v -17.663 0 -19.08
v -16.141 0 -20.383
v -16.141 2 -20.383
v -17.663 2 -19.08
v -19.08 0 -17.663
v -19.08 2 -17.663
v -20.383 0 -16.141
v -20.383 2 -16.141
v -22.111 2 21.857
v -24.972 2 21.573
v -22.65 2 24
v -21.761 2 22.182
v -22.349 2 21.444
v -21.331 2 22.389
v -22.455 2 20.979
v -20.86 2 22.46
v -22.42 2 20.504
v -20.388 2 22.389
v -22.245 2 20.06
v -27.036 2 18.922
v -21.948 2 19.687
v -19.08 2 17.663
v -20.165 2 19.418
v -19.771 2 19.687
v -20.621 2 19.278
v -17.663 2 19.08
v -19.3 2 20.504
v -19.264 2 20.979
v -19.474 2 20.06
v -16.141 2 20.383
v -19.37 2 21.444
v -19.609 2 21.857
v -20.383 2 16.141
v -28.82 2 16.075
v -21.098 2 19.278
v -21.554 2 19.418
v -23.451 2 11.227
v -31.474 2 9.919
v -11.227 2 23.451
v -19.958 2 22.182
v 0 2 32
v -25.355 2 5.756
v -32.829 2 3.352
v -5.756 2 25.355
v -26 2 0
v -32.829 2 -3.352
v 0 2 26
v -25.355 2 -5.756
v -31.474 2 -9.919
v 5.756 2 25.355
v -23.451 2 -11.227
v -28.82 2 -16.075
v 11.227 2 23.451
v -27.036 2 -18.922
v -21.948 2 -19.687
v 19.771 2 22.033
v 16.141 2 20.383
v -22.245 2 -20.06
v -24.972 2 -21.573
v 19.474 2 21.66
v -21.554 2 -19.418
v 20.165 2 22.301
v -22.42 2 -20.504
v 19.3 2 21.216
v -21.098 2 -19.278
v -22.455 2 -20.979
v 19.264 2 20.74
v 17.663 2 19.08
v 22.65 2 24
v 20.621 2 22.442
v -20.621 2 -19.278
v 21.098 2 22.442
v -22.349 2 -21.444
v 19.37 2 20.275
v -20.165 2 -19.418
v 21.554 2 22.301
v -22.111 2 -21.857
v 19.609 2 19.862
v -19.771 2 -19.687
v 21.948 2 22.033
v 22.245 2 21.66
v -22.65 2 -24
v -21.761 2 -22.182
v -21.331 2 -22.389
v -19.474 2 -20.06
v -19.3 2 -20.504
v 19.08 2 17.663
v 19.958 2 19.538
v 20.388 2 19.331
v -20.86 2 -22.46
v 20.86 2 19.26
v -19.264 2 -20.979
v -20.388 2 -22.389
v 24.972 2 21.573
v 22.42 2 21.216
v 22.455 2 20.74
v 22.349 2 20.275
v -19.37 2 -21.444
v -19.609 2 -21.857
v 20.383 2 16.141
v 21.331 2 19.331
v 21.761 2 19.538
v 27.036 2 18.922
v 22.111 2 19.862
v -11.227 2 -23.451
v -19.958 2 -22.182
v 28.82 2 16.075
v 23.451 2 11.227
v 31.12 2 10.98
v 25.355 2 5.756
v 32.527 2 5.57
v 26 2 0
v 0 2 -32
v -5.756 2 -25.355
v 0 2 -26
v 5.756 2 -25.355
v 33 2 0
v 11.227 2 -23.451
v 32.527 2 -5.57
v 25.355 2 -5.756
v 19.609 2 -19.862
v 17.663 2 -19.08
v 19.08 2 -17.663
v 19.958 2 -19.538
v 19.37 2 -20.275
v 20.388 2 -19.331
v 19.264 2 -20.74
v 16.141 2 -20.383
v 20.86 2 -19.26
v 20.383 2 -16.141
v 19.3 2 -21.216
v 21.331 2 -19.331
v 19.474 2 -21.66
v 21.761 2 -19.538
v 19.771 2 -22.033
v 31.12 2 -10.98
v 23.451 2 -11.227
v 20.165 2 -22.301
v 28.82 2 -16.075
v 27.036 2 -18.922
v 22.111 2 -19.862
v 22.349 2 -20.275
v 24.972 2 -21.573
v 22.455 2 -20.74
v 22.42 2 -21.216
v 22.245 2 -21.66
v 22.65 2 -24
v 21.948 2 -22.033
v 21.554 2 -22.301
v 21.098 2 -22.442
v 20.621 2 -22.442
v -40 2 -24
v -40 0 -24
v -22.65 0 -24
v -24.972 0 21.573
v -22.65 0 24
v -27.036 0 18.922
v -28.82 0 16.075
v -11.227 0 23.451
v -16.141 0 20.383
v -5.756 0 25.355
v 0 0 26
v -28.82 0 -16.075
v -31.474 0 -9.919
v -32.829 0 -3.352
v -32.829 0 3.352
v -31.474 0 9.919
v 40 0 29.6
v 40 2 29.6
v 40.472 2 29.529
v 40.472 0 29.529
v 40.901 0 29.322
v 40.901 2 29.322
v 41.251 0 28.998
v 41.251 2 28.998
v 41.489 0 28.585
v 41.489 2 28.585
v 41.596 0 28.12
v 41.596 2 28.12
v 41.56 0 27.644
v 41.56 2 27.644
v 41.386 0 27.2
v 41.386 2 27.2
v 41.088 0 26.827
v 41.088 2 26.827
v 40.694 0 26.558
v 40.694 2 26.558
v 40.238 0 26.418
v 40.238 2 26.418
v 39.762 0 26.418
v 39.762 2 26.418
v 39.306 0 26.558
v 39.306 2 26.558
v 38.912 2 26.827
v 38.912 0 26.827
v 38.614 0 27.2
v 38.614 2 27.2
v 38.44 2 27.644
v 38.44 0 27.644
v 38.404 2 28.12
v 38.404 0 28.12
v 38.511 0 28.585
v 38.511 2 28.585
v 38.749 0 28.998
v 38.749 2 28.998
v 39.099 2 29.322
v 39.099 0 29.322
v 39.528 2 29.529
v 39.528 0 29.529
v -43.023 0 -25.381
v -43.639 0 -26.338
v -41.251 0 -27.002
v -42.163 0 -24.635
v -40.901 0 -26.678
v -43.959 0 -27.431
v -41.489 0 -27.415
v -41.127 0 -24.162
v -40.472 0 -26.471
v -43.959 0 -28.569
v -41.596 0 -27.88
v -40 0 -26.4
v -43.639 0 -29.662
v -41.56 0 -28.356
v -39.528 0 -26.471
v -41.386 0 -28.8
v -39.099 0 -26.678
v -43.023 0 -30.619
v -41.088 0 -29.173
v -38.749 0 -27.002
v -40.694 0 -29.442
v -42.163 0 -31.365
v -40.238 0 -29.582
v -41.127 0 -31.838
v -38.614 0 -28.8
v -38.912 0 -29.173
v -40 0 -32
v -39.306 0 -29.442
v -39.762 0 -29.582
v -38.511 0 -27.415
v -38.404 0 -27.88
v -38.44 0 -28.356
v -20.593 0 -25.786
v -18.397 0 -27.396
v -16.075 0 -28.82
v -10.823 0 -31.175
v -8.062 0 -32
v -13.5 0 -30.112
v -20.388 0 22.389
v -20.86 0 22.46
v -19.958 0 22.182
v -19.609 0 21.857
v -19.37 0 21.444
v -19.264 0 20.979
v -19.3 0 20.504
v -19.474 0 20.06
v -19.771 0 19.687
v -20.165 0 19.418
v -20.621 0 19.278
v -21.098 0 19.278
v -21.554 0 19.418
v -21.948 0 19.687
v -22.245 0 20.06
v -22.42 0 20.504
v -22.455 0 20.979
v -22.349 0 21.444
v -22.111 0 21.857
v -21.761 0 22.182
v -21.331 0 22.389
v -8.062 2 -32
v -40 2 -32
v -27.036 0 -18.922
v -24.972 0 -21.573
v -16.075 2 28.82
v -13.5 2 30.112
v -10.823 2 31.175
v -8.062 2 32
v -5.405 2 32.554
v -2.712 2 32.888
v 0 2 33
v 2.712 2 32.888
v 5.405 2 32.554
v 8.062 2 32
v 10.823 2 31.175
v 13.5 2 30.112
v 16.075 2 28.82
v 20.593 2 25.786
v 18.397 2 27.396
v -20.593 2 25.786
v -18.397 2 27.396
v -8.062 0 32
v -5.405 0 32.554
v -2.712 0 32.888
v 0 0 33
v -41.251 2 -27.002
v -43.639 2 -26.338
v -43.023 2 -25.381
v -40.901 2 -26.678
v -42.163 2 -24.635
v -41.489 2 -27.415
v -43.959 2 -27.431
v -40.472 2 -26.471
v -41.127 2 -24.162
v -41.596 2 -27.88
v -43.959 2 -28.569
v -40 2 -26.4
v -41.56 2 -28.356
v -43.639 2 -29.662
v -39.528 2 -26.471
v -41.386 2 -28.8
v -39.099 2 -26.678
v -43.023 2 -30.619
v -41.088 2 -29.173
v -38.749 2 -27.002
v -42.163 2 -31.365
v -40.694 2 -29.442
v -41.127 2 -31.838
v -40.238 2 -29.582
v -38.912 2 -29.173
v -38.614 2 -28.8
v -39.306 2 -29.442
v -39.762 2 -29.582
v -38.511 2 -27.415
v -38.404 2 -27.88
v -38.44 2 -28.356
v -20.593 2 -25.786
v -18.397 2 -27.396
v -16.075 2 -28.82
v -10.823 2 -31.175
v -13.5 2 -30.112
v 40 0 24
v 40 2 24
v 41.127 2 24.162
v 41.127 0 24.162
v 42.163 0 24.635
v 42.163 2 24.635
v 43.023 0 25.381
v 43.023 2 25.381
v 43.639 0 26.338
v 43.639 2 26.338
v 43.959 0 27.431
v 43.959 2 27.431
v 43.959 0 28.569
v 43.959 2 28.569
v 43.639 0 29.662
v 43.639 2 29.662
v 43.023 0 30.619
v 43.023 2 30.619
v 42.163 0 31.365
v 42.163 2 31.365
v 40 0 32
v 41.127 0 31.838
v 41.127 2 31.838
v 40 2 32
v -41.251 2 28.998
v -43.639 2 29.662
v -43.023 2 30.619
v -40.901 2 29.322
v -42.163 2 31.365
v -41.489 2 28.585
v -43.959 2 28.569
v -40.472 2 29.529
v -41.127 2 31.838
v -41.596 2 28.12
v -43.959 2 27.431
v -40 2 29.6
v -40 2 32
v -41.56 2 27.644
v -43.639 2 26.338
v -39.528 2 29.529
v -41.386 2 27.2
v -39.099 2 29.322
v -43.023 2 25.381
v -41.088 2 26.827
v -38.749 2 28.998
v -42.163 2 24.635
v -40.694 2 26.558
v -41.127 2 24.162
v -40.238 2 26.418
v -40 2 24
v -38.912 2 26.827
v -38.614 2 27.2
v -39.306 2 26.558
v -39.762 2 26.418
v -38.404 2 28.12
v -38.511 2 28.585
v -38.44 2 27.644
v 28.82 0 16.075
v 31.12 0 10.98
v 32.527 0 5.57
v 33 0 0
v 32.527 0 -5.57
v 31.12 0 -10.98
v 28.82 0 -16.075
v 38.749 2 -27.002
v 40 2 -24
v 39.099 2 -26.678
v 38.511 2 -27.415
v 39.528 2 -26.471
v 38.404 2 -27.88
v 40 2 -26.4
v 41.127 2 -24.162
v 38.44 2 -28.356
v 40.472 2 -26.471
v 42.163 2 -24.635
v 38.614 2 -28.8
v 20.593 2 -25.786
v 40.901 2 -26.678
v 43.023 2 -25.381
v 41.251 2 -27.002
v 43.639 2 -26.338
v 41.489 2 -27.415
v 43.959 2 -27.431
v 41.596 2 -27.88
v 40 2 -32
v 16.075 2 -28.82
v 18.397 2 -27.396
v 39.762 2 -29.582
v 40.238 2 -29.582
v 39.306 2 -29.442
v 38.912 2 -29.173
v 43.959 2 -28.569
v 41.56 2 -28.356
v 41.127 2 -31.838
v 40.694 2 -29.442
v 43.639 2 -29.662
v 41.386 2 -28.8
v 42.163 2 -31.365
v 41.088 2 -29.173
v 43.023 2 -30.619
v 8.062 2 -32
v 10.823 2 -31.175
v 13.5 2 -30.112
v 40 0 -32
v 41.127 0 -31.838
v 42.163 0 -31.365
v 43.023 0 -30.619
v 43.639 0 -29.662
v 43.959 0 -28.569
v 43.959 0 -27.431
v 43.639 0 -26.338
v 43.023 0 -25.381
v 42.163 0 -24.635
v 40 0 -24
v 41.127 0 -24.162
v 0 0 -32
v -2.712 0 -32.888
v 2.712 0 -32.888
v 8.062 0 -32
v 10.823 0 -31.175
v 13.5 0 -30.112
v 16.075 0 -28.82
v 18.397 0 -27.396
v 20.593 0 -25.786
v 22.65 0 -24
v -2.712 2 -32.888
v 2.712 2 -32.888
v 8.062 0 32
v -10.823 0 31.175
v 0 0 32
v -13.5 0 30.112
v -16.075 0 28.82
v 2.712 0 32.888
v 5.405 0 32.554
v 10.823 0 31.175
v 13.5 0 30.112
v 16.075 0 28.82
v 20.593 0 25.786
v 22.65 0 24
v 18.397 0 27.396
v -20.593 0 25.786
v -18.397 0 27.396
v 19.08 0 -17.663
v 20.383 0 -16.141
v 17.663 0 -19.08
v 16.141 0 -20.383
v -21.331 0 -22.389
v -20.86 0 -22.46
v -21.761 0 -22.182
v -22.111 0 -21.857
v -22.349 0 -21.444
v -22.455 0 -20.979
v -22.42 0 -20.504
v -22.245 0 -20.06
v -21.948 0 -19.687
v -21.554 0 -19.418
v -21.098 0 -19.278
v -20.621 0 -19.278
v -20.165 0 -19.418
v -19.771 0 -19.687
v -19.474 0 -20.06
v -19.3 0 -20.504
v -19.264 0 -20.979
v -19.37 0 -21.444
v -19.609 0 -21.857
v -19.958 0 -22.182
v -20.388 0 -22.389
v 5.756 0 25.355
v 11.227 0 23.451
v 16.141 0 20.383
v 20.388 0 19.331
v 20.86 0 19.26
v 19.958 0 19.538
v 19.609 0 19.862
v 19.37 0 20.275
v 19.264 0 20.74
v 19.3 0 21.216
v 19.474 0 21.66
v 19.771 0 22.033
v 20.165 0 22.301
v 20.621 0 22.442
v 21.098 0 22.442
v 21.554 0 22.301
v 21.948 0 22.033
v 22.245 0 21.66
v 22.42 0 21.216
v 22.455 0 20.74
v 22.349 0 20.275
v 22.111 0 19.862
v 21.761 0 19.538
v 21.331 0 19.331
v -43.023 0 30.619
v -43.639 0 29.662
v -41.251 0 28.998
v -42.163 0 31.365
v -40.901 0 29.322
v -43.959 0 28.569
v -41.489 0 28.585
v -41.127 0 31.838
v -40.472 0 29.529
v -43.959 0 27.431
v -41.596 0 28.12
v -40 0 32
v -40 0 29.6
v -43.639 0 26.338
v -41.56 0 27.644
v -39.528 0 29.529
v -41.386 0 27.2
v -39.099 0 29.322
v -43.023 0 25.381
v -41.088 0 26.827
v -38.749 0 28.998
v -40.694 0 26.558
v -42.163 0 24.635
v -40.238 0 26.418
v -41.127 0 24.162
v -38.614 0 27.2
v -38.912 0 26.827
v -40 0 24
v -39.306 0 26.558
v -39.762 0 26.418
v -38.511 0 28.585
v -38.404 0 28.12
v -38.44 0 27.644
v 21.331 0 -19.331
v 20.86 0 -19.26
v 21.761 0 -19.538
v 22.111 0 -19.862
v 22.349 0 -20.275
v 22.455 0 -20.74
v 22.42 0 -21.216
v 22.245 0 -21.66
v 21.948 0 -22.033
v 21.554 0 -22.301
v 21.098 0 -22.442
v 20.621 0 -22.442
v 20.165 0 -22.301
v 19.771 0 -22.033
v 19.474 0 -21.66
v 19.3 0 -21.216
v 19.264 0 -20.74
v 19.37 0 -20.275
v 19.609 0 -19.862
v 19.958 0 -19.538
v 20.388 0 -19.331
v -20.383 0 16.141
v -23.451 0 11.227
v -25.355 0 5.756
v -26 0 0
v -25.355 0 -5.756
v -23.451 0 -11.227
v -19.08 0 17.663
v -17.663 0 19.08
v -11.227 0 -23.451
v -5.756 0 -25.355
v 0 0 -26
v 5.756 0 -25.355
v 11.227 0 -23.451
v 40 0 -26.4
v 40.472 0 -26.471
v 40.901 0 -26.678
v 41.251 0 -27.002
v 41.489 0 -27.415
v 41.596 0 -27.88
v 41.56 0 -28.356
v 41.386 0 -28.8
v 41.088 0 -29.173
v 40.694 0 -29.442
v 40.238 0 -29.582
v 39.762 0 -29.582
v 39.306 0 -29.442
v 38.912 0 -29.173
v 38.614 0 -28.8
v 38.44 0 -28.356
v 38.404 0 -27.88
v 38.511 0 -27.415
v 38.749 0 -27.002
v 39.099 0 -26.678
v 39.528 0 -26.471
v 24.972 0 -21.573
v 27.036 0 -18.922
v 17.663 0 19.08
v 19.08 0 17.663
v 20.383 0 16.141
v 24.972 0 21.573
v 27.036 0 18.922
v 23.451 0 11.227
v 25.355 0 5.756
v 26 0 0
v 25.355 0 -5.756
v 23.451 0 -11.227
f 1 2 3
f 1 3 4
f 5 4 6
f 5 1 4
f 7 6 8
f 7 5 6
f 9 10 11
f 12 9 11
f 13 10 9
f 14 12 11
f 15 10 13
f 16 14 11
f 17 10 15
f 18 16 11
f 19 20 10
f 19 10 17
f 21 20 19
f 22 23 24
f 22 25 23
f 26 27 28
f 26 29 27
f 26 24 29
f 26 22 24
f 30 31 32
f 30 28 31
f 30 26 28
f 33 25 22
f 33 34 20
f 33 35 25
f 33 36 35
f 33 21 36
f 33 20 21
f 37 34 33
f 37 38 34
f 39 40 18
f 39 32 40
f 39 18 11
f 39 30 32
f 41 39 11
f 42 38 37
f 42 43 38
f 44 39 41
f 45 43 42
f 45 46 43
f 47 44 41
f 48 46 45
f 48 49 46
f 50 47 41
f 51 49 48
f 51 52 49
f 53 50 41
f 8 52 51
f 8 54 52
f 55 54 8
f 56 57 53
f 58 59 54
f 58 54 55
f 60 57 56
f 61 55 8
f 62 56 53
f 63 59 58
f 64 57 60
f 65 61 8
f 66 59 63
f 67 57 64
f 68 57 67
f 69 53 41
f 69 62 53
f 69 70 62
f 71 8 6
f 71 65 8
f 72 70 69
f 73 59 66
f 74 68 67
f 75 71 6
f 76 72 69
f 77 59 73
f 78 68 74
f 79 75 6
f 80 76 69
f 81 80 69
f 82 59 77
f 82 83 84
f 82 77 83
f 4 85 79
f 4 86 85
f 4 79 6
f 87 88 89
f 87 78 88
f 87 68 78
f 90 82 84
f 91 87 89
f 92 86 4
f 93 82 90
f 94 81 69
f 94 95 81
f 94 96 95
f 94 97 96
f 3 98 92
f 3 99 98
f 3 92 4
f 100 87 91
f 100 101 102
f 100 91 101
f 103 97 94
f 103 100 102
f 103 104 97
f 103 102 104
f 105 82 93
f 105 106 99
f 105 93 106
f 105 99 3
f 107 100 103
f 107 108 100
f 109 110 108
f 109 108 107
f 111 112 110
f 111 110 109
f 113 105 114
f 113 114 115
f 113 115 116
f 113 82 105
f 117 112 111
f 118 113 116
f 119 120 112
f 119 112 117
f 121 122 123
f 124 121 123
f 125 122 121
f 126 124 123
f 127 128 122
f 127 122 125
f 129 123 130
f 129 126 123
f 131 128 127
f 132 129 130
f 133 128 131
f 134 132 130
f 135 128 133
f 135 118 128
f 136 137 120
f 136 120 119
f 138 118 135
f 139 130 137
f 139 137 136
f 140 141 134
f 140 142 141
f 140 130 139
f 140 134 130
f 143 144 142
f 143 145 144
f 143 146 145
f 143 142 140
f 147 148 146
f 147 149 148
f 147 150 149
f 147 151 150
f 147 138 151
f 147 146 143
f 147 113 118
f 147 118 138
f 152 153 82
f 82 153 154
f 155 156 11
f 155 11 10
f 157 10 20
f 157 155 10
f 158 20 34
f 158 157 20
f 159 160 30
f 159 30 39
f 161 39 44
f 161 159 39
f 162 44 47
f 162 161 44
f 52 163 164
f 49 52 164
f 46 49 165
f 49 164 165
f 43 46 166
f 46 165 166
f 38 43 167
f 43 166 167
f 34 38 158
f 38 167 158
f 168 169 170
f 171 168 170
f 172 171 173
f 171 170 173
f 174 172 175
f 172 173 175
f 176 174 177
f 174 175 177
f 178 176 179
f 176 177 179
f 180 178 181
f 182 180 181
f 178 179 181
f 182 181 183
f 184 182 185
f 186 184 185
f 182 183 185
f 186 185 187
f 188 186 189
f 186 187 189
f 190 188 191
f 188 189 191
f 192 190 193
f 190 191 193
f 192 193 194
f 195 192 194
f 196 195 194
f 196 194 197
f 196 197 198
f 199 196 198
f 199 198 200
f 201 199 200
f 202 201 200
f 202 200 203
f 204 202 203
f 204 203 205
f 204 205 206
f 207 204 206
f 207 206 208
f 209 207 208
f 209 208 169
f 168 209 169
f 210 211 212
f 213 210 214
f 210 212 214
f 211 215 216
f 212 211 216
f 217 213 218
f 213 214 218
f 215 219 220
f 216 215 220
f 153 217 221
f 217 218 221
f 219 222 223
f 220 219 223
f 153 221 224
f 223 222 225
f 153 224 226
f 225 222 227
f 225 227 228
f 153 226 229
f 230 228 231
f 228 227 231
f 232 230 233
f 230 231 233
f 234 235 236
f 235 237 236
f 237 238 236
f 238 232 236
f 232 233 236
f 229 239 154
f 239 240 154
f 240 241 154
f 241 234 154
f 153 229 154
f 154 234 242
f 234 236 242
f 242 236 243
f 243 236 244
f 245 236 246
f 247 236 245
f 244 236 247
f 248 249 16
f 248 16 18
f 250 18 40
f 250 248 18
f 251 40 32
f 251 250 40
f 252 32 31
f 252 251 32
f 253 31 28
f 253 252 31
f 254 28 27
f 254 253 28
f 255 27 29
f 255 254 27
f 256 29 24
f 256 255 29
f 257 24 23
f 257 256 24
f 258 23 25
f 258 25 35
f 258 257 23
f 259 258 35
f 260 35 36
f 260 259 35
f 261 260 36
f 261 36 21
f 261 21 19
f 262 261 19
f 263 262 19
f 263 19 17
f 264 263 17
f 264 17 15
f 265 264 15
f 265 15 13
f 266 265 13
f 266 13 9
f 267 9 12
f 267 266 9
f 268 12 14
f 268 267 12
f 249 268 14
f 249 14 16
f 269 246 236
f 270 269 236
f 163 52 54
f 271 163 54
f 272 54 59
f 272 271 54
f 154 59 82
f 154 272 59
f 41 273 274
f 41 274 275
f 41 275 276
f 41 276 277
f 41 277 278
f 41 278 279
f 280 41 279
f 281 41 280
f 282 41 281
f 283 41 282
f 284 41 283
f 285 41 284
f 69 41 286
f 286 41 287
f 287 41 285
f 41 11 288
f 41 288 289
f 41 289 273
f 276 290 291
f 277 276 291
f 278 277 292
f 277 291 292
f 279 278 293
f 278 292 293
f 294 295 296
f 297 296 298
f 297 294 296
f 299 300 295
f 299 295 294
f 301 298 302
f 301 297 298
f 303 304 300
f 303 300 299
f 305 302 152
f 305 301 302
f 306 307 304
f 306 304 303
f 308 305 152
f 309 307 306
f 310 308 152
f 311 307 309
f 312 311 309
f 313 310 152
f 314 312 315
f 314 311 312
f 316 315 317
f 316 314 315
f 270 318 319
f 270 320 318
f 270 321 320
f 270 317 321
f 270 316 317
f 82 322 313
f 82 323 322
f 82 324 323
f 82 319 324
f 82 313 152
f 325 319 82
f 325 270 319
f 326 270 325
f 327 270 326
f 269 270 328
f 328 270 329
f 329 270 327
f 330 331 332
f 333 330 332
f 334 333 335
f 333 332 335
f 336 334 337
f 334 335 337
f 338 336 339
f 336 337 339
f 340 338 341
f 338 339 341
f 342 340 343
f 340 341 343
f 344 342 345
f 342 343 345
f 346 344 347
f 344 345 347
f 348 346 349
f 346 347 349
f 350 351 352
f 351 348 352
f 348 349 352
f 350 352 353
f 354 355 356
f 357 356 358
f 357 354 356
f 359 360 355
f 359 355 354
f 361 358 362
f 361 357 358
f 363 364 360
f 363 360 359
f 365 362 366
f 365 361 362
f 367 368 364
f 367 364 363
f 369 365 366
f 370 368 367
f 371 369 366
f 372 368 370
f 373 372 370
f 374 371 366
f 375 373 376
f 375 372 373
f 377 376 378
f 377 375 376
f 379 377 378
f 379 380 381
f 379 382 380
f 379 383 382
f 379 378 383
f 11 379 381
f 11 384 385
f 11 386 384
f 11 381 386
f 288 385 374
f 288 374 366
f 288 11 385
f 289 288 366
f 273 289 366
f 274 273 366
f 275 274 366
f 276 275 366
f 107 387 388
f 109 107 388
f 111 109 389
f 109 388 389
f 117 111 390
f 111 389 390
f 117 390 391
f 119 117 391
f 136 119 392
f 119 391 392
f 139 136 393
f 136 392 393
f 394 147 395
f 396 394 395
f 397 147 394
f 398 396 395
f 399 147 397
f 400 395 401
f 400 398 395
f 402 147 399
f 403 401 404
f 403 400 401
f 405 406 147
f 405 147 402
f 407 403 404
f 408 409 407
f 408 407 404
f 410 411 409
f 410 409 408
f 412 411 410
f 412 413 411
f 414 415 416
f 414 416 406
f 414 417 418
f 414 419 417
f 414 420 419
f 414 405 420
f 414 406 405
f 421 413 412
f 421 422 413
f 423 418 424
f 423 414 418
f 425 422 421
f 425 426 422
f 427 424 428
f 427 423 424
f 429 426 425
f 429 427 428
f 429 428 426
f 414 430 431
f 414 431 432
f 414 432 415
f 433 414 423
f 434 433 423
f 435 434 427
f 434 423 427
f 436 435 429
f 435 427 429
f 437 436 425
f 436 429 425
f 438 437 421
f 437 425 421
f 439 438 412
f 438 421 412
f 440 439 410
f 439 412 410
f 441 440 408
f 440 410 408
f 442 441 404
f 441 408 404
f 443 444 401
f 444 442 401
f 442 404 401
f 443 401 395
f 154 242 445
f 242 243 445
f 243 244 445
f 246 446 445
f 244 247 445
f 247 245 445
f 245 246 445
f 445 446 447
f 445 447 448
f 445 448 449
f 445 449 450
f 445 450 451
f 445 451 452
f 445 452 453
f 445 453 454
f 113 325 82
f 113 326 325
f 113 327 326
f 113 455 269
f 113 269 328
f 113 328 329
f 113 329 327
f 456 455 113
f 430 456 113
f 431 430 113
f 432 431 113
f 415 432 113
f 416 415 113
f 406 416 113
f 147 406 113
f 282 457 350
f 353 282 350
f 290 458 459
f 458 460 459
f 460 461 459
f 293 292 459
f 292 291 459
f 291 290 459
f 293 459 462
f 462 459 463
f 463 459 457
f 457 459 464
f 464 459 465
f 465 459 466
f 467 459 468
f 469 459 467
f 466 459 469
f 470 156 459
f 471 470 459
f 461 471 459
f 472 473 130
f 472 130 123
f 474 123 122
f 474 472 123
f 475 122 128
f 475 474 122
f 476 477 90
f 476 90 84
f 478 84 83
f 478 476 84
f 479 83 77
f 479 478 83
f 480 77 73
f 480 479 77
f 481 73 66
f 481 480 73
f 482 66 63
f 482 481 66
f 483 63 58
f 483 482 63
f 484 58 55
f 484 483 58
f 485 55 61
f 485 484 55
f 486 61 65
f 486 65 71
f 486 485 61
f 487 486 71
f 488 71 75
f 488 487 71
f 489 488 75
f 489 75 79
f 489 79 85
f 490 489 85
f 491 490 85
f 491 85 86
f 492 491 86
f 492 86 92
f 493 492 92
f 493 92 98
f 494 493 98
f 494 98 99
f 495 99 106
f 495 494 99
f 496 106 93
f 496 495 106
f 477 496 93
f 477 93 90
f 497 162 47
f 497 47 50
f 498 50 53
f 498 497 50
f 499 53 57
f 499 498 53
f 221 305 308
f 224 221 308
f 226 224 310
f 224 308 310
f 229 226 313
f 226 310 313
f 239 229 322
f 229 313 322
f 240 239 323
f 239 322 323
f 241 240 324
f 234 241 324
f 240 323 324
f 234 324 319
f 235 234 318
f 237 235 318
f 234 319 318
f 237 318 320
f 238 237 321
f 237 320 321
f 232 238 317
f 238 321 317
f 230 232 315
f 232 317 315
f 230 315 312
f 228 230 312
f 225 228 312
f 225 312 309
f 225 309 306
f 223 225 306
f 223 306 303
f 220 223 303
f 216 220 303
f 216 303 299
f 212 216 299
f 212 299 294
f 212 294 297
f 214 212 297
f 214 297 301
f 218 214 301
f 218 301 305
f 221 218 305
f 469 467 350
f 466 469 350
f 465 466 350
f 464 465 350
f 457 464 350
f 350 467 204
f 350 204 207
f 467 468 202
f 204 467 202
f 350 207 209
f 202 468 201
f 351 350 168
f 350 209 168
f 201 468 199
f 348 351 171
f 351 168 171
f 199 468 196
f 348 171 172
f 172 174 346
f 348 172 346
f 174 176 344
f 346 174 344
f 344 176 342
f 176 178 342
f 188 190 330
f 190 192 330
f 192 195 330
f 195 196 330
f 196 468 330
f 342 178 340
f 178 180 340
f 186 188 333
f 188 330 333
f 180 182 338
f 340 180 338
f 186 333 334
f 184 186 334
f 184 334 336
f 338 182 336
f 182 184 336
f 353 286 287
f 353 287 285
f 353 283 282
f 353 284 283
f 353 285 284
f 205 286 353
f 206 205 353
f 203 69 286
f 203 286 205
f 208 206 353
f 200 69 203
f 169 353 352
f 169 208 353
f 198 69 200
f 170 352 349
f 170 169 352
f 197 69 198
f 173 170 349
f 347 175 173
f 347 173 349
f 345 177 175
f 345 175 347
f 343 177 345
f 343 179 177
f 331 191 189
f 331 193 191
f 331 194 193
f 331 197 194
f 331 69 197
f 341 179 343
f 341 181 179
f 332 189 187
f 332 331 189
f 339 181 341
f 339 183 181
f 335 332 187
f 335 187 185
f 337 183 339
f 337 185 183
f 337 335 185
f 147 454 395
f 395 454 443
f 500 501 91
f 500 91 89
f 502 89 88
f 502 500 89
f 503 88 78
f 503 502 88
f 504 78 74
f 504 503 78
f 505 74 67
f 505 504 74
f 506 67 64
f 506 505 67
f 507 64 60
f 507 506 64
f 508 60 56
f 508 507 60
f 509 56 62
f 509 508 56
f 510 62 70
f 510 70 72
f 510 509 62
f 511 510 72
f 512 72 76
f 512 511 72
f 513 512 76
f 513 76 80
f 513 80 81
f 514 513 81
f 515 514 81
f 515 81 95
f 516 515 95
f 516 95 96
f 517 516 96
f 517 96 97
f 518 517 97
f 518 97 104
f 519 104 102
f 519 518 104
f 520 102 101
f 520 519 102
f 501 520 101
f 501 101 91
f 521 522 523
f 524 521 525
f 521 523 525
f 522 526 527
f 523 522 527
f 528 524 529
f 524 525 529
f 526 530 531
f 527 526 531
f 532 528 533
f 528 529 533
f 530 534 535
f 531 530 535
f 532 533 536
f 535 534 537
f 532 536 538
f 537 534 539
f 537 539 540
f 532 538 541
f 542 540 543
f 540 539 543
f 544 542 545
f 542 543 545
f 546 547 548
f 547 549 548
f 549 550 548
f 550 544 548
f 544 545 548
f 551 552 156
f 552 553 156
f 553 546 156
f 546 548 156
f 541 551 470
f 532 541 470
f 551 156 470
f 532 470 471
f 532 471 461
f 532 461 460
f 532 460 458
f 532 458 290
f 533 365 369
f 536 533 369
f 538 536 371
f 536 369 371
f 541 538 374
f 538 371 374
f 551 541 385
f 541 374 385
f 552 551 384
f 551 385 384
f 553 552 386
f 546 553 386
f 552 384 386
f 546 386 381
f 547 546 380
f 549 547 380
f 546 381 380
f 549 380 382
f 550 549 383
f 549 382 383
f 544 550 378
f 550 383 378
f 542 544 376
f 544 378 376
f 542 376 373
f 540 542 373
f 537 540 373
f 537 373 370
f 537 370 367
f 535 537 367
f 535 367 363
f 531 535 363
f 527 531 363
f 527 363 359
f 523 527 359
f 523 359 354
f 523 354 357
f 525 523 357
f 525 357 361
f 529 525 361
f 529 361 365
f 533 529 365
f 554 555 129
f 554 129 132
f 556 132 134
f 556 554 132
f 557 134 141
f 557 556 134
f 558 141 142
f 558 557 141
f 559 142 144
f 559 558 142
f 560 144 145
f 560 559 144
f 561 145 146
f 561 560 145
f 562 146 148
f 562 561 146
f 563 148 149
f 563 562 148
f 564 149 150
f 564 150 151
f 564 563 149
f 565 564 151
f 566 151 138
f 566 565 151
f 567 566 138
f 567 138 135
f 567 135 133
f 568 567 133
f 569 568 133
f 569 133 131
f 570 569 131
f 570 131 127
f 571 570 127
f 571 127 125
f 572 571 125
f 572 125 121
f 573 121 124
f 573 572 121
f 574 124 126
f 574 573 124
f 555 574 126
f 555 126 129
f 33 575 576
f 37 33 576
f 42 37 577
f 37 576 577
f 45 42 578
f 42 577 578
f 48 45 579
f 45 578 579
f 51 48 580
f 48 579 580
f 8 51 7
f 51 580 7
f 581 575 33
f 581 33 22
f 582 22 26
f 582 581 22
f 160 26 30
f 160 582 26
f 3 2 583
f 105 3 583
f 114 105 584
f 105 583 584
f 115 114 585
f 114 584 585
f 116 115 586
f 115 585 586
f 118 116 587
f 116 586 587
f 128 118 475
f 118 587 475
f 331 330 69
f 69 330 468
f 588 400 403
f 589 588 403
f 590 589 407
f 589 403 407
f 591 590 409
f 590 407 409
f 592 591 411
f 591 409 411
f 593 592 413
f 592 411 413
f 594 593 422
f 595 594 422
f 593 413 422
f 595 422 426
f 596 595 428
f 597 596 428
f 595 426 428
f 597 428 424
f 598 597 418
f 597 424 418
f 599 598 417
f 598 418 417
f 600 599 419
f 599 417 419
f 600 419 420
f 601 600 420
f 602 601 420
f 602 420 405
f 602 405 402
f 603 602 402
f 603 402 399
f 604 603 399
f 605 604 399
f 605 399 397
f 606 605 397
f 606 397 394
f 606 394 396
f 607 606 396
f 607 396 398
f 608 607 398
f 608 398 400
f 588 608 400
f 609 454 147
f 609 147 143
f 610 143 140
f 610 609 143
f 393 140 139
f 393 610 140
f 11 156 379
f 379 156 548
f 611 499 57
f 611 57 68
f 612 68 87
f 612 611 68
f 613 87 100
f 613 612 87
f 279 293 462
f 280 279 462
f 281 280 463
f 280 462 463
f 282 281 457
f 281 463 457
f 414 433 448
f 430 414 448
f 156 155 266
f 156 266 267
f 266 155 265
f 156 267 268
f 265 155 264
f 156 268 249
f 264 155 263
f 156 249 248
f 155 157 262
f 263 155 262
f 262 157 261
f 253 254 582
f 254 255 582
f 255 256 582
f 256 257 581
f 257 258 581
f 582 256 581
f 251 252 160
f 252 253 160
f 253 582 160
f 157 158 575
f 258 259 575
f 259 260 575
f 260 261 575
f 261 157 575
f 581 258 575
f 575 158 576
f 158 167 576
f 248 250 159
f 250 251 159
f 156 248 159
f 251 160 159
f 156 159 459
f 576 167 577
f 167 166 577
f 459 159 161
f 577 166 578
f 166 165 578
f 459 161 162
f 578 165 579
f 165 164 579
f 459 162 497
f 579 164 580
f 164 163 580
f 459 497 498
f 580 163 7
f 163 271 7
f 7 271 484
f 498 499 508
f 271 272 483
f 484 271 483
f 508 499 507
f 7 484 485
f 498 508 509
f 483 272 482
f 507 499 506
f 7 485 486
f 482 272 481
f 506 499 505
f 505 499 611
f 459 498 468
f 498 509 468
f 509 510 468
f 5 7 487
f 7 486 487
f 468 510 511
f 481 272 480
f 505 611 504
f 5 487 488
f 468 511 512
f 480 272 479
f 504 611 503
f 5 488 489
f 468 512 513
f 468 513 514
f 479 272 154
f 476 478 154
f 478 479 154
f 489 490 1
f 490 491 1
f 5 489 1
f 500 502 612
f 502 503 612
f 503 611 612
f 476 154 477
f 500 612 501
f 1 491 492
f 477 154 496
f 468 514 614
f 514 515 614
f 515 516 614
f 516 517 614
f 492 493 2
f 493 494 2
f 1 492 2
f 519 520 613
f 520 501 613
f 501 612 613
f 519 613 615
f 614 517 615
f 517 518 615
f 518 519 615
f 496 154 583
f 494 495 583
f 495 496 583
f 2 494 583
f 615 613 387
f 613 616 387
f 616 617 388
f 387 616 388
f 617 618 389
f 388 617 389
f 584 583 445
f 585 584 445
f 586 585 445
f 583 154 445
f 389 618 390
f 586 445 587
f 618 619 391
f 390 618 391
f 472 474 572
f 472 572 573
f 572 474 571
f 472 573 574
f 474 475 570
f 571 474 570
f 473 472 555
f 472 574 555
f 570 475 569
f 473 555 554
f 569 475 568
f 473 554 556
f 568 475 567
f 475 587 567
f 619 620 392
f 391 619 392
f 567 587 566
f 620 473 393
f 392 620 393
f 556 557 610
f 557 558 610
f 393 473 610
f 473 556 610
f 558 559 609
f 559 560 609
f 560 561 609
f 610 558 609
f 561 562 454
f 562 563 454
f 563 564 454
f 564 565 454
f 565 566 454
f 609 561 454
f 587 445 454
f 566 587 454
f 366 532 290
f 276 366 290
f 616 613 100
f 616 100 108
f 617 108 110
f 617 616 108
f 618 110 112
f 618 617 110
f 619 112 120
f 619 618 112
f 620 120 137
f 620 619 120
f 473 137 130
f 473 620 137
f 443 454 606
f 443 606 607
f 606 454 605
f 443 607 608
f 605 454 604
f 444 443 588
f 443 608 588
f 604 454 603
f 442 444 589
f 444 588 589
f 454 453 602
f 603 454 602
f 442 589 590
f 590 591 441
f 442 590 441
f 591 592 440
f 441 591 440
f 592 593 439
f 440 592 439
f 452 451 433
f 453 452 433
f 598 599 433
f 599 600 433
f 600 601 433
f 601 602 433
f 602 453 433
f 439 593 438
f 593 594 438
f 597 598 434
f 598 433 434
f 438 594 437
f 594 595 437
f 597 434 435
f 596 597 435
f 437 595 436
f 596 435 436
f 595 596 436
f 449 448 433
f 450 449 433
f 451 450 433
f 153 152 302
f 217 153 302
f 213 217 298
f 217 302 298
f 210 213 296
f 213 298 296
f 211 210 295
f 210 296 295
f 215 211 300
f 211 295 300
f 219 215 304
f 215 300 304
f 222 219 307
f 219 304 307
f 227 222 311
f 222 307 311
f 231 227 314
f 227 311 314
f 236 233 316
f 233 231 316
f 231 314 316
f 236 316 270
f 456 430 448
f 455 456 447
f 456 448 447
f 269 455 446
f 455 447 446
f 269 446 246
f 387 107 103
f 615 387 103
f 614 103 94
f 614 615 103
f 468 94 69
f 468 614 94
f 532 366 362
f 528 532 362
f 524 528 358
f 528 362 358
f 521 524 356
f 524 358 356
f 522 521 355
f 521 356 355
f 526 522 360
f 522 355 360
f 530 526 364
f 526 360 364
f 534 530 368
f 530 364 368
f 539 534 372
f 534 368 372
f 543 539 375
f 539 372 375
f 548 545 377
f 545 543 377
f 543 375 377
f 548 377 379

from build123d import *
from build123d.topology import SkipClean

# Parameters (mm, degrees)
SKETCH1_R           = 1.6
BOSS_EXTRUDE1_DEPTH = 2
SKETCH2_R           = 48
SKETCH2_R_2         = 42
SKETCH2_R_3         = 1.6
BOSS_EXTRUDE2_DEPTH = 2
SKETCH3_R           = 1.6
BOSS_EXTRUDE3_DEPTH = 2
CUT_EXTRUDE1_DEPTH  = 10
FILLET1_R           = 3
BOSS_EXTRUDE4_DEPTH = 2
CUT_EXTRUDE2_START  = -10
SKETCH6_R           = 26
CUT_EXTRUDE2_DEPTH  = 10
CUT_EXTRUDE3_START  = -10
SKETCH7_R           = 112.740823419
SKETCH7_R_2         = 33
CUT_EXTRUDE3_DEPTH  = 10
BOSS_EXTRUDE5_START = -2
SKETCH8_R           = 1.6
SKETCH8_R_2         = 26
BOSS_EXTRUDE5_DEPTH = 2
SKETCH9_R           = 1.6
CUT_EXTRUDE4_DEPTH  = 5


with BuildPart() as part:
    # Sketch1 → Boss-Extrude1 (new body)
    with BuildSketch(Plane(origin=(0, 0, 0), x_dir=(1, 0, 0), z_dir=(0, 1, 0))):
        with BuildLine():
            Line((-51.943772875, 37.828427125), (-29.299283734, 15.183937983))
            ThreePointArc((-29.299283734, 15.183937983), (0, 33), (29.299283734, 15.183937983))
            Line((29.299283734, 15.183937983), (51.943772875, 37.828427125))
            ThreePointArc((51.943772875, 37.828427125), (57.600627125, 37.828427125), (57.600627125, 32.171572875))
            Line((57.600627125, 32.171572875), (32.280845123, 6.851790873))
            ThreePointArc((32.280845123, 6.851790873), (33, 0), (32.280845123, -6.851790873))
            Line((32.280845123, -6.851790873), (57.600627125, -32.171572875))
            ThreePointArc((57.600627125, -32.171572875), (57.600627125, -37.828427125), (51.943772875, -37.828427125))
            Line((51.943772875, -37.828427125), (29.299283734, -15.183937983))
            ThreePointArc((29.299283734, -15.183937983), (0, -33), (-29.299283734, -15.183937983))
            Line((-29.299283734, -15.183937983), (-51.943772875, -37.828427125))
            ThreePointArc((-51.943772875, -37.828427125), (-57.600627125, -37.828427125), (-57.600627125, -32.171572875))
            Line((-57.600627125, -32.171572875), (-32.280845123, -6.851790873))
            ThreePointArc((-32.280845123, -6.851790873), (-33, 0), (-32.280845123, 6.851790873))
            Line((-32.280845123, 6.851790873), (-57.600627125, 32.171572875))
            ThreePointArc((-57.600627125, 32.171572875), (-57.600627125, 37.828427125), (-51.943772875, 37.828427125))
        make_face()
        with Locations(Location((54.7722, 35, 0), (0, 0, 270))):
            Circle(SKETCH1_R, mode=Mode.SUBTRACT)
        with Locations(Location((-54.7722, 35, 0), (0, 0, 90))):
            Circle(SKETCH1_R, mode=Mode.SUBTRACT)
        with Locations(Location((54.7722, -35, 0), (0, 0, 90))):
            Circle(SKETCH1_R, mode=Mode.SUBTRACT)
        with Locations(Location((-54.7722, -35, 0), (0, 0, 270))):
            Circle(SKETCH1_R, mode=Mode.SUBTRACT)
        with Locations(Location((20.859650045, 20.859650045, 0), (0, 0, 270))):
            Circle(SKETCH1_R, mode=Mode.SUBTRACT)
        with Locations(Location((-20.859650045, 20.859650045, 0), (0, 0, 90))):
            Circle(SKETCH1_R, mode=Mode.SUBTRACT)
        with Locations(Location((20.859650045, -20.859650045, 0), (0, 0, 90))):
            Circle(SKETCH1_R, mode=Mode.SUBTRACT)
        with Locations(Location((-20.859650045, -20.859650045, 0), (0, 0, 270))):
            Circle(SKETCH1_R, mode=Mode.SUBTRACT)
        with BuildLine():
            Line((0, 4.242640687), (-16.140662024, 20.383302711))
            ThreePointArc((-16.140662024, 20.383302711), (0, 26), (16.140662024, 20.383302711))
            Line((16.140662024, 20.383302711), (0, 4.242640687))
        make_face(mode=Mode.SUBTRACT)
        with BuildLine():
            Line((0, -4.242640687), (-16.140662024, -20.383302711))
            ThreePointArc((-16.140662024, -20.383302711), (0, -26), (16.140662024, -20.383302711))
            Line((16.140662024, -20.383302711), (0, -4.242640687))
        make_face(mode=Mode.SUBTRACT)
        with BuildLine():
            Line((4.242640687, 0), (20.383302711, -16.140662024))
            ThreePointArc((20.383302711, -16.140662024), (26, 0), (20.383302711, 16.140662024))
            Line((20.383302711, 16.140662024), (4.242640687, 0))
        make_face(mode=Mode.SUBTRACT)
        with BuildLine():
            Line((-4.242640687, 0), (-20.383302711, -16.140662024))
            ThreePointArc((-20.383302711, -16.140662024), (-26, 0), (-20.383302711, 16.140662024))
            Line((-20.383302711, 16.140662024), (-4.242640687, 0))
        make_face(mode=Mode.SUBTRACT)
    extrude(amount=BOSS_EXTRUDE1_DEPTH)

    # Sketch2 → Boss-Extrude2 (add)
    with BuildSketch(Plane(origin=(0, 2, 0), x_dir=(1, 0, 0), z_dir=(0, 1, 0))):
        Circle(SKETCH2_R)
        Circle(SKETCH2_R_2, mode=Mode.SUBTRACT)
        with Locations(Location((31.819805153, 31.819805153, 0), (0, 0, 270))):
            Circle(SKETCH2_R_3, mode=Mode.SUBTRACT)
        with Locations(Location((-31.819805153, 31.819805153, 0), (0, 0, 270))):
            Circle(SKETCH2_R_3, mode=Mode.SUBTRACT)
        with Locations(Location((31.819805153, -31.819805153, 0), (0, 0, 270))):
            Circle(SKETCH2_R_3, mode=Mode.SUBTRACT)
        with Locations(Location((-31.819805153, -31.819805153, 0), (0, 0, 270))):
            Circle(SKETCH2_R_3, mode=Mode.SUBTRACT)
    extrude(amount=-BOSS_EXTRUDE2_DEPTH)

    # Sketch3 → Boss-Extrude3 (add)
    # profile 1 of 2: a face of its own
    with BuildSketch(Plane(origin=(0, 2, 0), x_dir=(1, 0, 0), z_dir=(0, 1, 0))):
        with BuildLine():
            Line((34.819811892, 31.819805153), (34.819811892, -31.819805153))
            ThreePointArc((34.819811892, -31.819805153), (31.819805153, -34.819811892), (28.819798415, -31.819805153))
            Line((28.819798415, -31.819805153), (28.819798415, 31.819805153))
            ThreePointArc((28.819798415, 31.819805153), (31.819805153, 34.819811892), (34.819811892, 31.819805153))
        make_face()
        with Locations(Location((31.819805153, -31.819805153, 0), (0, 0, 270))):
            Circle(SKETCH3_R, mode=Mode.SUBTRACT)
        with Locations(Location((31.819805153, 31.819805153, 0), (0, 0, 270))):
            Circle(SKETCH3_R, mode=Mode.SUBTRACT)
    # profile 2 of 2: a face of its own
    with BuildSketch(Plane(origin=(0, 2, 0), x_dir=(1, 0, 0), z_dir=(0, 1, 0))):
        with BuildLine():
            Line((-28.819798415, -31.819805153), (-28.819798415, 31.819805153))
            ThreePointArc((-28.819798415, 31.819805153), (-31.819805153, 34.819811892), (-34.819811892, 31.819805153))
            Line((-34.819811892, 31.819805153), (-34.819811892, -31.819805153))
            ThreePointArc((-34.819811892, -31.819805153), (-31.819805153, -34.819811892), (-28.819798415, -31.819805153))
        make_face()
        with Locations(Location((-31.819805153, 31.819805153, 0), (0, 0, 270))):
            Circle(SKETCH3_R, mode=Mode.SUBTRACT)
        with Locations(Location((-31.819805153, -31.819805153, 0), (0, 0, 270))):
            Circle(SKETCH3_R, mode=Mode.SUBTRACT)
    extrude(amount=-BOSS_EXTRUDE3_DEPTH)

    # Sketch4 → Cut-Extrude1 (cut)
    with BuildSketch(Plane(origin=(0, 2, 0), x_dir=(1, 0, 0), z_dir=(0, 1, 0))):
        Polygon((-28.819805153, 31.819805153), (-28.819805153, 24.740165209), (0, 38.846192425), (28.819805153, 24.740165209), (28.819805153, 31.819805153), (28.819805153, 53.488724091), (-28.819805153, 53.488724091), align=None)
        Polygon((28.819805153, -31.819805153), (28.819805153, -27.443703625), (0, -37.592318486), (-28.819805153, -27.443703625), (-28.819805153, -31.819805153), (-28.819805153, -57.678243433), (28.819805153, -57.678243433), align=None)
    extrude(amount=-CUT_EXTRUDE1_DEPTH, mode=Mode.SUBTRACT)

    # Fillet1
    # the kernel refuses this fillet: 3 mm, written as the material it takes off along each edge
    with BuildSketch(Plane(origin=(-28.819805153, -16.95161691, -38.385138152), x_dir=(0, 0, 1), z_dir=(0, 1, 0)), Plane(origin=(28.819805153, -16.95161691, 38.385138152), x_dir=(0, 0, -1), z_dir=(0, 1, 0))) as fillet1_piece_1:
        with BuildLine():
            CenterArc((6.565332998, -3), FILLET1_R, 90, 135)
            ThreePointArc((4.444012655, -5.121320344), (2.131461319, -2.639230371), (0, 0))
            Line((0, 0), (6.565332998, 0))
        make_face()
    extrude(amount=35.903233819, mode=Mode.SUBTRACT)
    with BuildSketch(Plane(origin=(-28.819805153, -16.95161691, 38.385138152), x_dir=(-0.755284934005079, 0, -0.6553965734308833), z_dir=(0, 1, 0)), Plane(origin=(28.819805153, -16.95161691, -38.385138152), x_dir=(0.7552849340050823, 0, 0.6553965734308795), z_dir=(0, 1, 0))) as fillet1_piece_2:
        with BuildLine():
            CenterArc((6.568751552, -2.99250738), FILLET1_R, 85.949727095, 135)
            Line((4.30289675, -4.9586971), (0, 0))
            ThreePointArc((0, 0), (3.390323382, 0.11988192), (6.780646764, 0))
        make_face()
    extrude(amount=35.903233819, mode=Mode.SUBTRACT)


with BuildPart() as boss_extrude4_tool:
    # Sketch5 → Boss-Extrude4 (new body)
    with BuildSketch(Plane(origin=(0, 2, 0), x_dir=(1, 0, 0), z_dir=(0, 1, 0))):
        Polygon((-31.819798415, 34.819811892), (31.819798415, 34.819811892), (29.753362448, 32.753375926), (28.819798415, 31.819811892), (28.819798415, 28.819811892), (0, 28.819811892), (-28.819798415, 28.819811892), (-28.819798415, 31.819811892), align=None)
        Polygon((-28.819798415, -31.819811892), (-31.819798415, -34.819811892), (31.819798415, -34.819811892), (29.753362448, -32.753375926), (28.819798415, -31.819811892), (28.819798415, -28.819811892), (0, -28.819811892), (-28.819798415, -28.819811892), align=None)
    extrude(amount=-BOSS_EXTRUDE4_DEPTH)


with BuildPart() as part_1:
    add(part.part)


with BuildPart() as part_2:
    # Boss-Extrude4: joined with boss_extrude4_tool
    add(part_1.part.fuse(boss_extrude4_tool.part, tol=0.00001))

    # Sketch6 → Cut-Extrude2 (cut)
    with BuildSketch(Plane(origin=(0, 2, 0), x_dir=(1, 0, 0), z_dir=(0, 1, 0)).offset(CUT_EXTRUDE2_START)):
        with Locations(Location((0, 0, 0), (0, 0, 270))):
            Circle(SKETCH6_R)
    extrude(amount=CUT_EXTRUDE2_DEPTH, mode=Mode.SUBTRACT)

    # Sketch7 → Cut-Extrude3 (cut)
    with SkipClean():  # the faces are left unmerged after this step: merging them gives an invalid solid
        with BuildSketch(Plane(origin=(0, 2, 0), x_dir=(1, 0, 0), z_dir=(0, 1, 0)).offset(CUT_EXTRUDE3_START)):
            Circle(SKETCH7_R)
            with Locations(Location((0, 0, 0), (0, 0, 270))):
                Circle(SKETCH7_R_2, mode=Mode.SUBTRACT)
        extrude(amount=CUT_EXTRUDE3_DEPTH, mode=Mode.SUBTRACT)

    # Sketch8 → Boss-Extrude5 (add)
    # profile 1 of 5: a face of its own
    with SkipClean():  # the faces are left unmerged after this step: merging them gives an invalid solid
        with BuildSketch(Plane(origin=(0, 2, 0), x_dir=(1, 0, 0), z_dir=(0, 1, 0)).offset(BOSS_EXTRUDE5_START)):
            with BuildLine():
                ThreePointArc((60, 24), (64, 28), (60, 32))
                Line((60, 32), (8.062257748, 32))
                ThreePointArc((8.062257748, 32), (15.86830384, 28.934355587), (22.649503306, 24))
                Line((22.649503306, 24), (60, 24))
            make_face()
            with Locations(Location((60, 28, 0), (0, 0, 270))):
                Circle(SKETCH8_R, mode=Mode.SUBTRACT)
        # profile 2 of 5: a face of its own
        with BuildSketch(Plane(origin=(0, 2, 0), x_dir=(1, 0, 0), z_dir=(0, 1, 0)).offset(BOSS_EXTRUDE5_START)):
            with BuildLine():
                ThreePointArc((-22.649503306, 24), (-15.86830384, 28.934355587), (-8.062257748, 32))
                Line((-8.062257748, 32), (-60, 32))
                ThreePointArc((-60, 32), (-64, 28), (-60, 24))
                Line((-60, 24), (-22.649503306, 24))
            make_face()
            with Locations(Location((-60, 28, 0), (0, 0, 270))):
                Circle(SKETCH8_R, mode=Mode.SUBTRACT)
        # profile 3 of 5: a face of its own
        with BuildSketch(Plane(origin=(0, 2, 0), x_dir=(1, 0, 0), z_dir=(0, 1, 0)).offset(BOSS_EXTRUDE5_START)):
            with BuildLine():
                ThreePointArc((-8.062257748, -32), (-15.86830384, -28.934355587), (-22.649503306, -24))
                Line((-22.649503306, -24), (-60, -24))
                ThreePointArc((-60, -24), (-64, -28), (-60, -32))
                Line((-60, -32), (-8.062257748, -32))
            make_face()
            with Locations(Location((-60, -28, 0), (0, 0, 270))):
                Circle(SKETCH8_R, mode=Mode.SUBTRACT)
        # profile 4 of 5: a face of its own
        with BuildSketch(Plane(origin=(0, 2, 0), x_dir=(1, 0, 0), z_dir=(0, 1, 0)).offset(BOSS_EXTRUDE5_START)):
            with BuildLine():
                Line((60, -24), (22.649503306, -24))
                ThreePointArc((22.649503306, -24), (15.86830384, -28.934355587), (8.062257748, -32))
                Line((8.062257748, -32), (60, -32))
                ThreePointArc((60, -32), (64, -28), (60, -24))
            make_face()
            with Locations(Location((60, -28, 0), (0, 0, 270))):
                Circle(SKETCH8_R, mode=Mode.SUBTRACT)
        # profile 5 of 5: a face of its own
        with BuildSketch(Plane(origin=(0, 2, 0), x_dir=(1, 0, 0), z_dir=(0, 1, 0)).offset(BOSS_EXTRUDE5_START)):
            with BuildLine():
                Line((22.649503306, 24), (0, 32))
                Line((0, 32), (-22.649503306, 24))
                ThreePointArc((-22.649503306, 24), (-33, 0), (-22.649503306, -24))
                Line((-22.649503306, -24), (0, -32))
                Line((0, -32), (22.649503306, -24))
                ThreePointArc((22.649503306, -24), (30.302092412, -13.068404472), (33, 0))
                ThreePointArc((33, 0), (30.302092412, 13.068404472), (22.649503306, 24))
            make_face()
            with Locations(Location((-20.859650045, -20.859650045, 0), (0, 0, 270))):
                Circle(SKETCH8_R, mode=Mode.SUBTRACT)
            with Locations(Location((20.859650045, -20.859650045, 0), (0, 0, 90))):
                Circle(SKETCH8_R, mode=Mode.SUBTRACT)
            with Locations(Location((-20.859650045, 20.859650045, 0), (0, 0, 90))):
                Circle(SKETCH8_R, mode=Mode.SUBTRACT)
            with Locations(Location((0, 0, 0), (0, 0, 270))):
                Circle(SKETCH8_R_2, mode=Mode.SUBTRACT)
            with Locations(Location((20.859650045, 20.859650045, 0), (0, 0, 270))):
                Circle(SKETCH8_R, mode=Mode.SUBTRACT)
        extrude(amount=BOSS_EXTRUDE5_DEPTH)

    # Sketch9 → Cut-Extrude4 (cut)
    with SkipClean():  # the faces are left unmerged after this step: merging them gives an invalid solid
        with BuildSketch(Plane(origin=(0, 2, 0), x_dir=(1, 0, 0), z_dir=(0, 1, 0))):
            with Locations(Location((40, 28, 0), (0, 0, 270))):
                Circle(SKETCH9_R)
            with Locations(Location((-40, 28, 0), (0, 0, 270))):
                Circle(SKETCH9_R)
            with Locations(Location((-40, -28, 0), (0, 0, 270))):
                Circle(SKETCH9_R)
            with Locations(Location((40, -28, 0), (0, 0, 270))):
                Circle(SKETCH9_R)
            with BuildLine():
                Line((-40, 32), (-88.801231513, 51.827440304))
                Line((-88.801231513, 51.827440304), (-77.903174013, 7.237500813))
                Line((-77.903174013, 7.237500813), (-40, 24))
                ThreePointArc((-40, 24), (-44, 28), (-40, 32))
            make_face()
            with BuildLine():
                Line((-40, -24), (-110.099658322, -14.969056523))
                Line((-110.099658322, -14.969056523), (-87.813441409, -65.362398728))
                Line((-87.813441409, -65.362398728), (-40, -32))
                ThreePointArc((-40, -32), (-44, -28), (-40, -24))
            make_face()
            with BuildLine():
                Line((40, -32), (82.780855651, -58.25577253))
                Line((82.780855651, -58.25577253), (126.86328335, 11.448571628))
                Line((126.86328335, 11.448571628), (40, -24))
                ThreePointArc((40, -24), (44, -28), (40, -32))
            make_face()
            with BuildLine():
                Line((40, 24), (64.956913766, 7.237500813))
                Line((64.956913766, 7.237500813), (132.433265189, 44.868462663))
                Line((132.433265189, 44.868462663), (31.218738054, 101.841419761))
                Line((31.218738054, 101.841419761), (40, 32))
                ThreePointArc((40, 32), (44, 28), (40, 24))
            make_face()
        extrude(amount=-CUT_EXTRUDE4_DEPTH, mode=Mode.SUBTRACT)


solid = part_2.part
